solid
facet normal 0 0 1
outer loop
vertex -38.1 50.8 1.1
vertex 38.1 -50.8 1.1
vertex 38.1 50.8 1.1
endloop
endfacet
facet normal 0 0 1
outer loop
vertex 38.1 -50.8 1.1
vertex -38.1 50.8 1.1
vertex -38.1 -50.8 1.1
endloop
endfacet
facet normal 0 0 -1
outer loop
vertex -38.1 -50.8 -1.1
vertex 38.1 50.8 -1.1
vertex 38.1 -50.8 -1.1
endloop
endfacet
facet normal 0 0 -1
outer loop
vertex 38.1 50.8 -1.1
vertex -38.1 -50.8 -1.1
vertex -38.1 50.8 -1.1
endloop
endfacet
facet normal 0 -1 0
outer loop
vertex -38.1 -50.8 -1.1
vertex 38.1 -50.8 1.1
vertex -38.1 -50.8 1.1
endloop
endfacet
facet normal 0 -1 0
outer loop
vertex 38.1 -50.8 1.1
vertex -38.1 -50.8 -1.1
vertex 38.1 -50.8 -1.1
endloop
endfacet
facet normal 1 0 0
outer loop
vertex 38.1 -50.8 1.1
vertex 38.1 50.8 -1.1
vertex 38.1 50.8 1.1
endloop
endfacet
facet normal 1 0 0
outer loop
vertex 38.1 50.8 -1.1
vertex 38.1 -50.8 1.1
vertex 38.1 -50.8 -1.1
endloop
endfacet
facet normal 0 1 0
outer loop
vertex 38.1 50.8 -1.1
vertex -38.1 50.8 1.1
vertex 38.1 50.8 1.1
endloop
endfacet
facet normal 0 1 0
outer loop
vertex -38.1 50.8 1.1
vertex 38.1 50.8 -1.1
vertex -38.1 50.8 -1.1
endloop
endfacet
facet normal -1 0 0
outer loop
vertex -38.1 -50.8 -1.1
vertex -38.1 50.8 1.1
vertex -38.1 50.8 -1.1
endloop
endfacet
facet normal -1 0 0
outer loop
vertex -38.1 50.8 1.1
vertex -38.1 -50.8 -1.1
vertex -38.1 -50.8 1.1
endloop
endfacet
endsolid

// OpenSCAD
//Plate for maintaining orthogonality when measuring material sheets
length = 76.2;
width = 101.6;
height = 2.2;
cube([length,width,height], true);
